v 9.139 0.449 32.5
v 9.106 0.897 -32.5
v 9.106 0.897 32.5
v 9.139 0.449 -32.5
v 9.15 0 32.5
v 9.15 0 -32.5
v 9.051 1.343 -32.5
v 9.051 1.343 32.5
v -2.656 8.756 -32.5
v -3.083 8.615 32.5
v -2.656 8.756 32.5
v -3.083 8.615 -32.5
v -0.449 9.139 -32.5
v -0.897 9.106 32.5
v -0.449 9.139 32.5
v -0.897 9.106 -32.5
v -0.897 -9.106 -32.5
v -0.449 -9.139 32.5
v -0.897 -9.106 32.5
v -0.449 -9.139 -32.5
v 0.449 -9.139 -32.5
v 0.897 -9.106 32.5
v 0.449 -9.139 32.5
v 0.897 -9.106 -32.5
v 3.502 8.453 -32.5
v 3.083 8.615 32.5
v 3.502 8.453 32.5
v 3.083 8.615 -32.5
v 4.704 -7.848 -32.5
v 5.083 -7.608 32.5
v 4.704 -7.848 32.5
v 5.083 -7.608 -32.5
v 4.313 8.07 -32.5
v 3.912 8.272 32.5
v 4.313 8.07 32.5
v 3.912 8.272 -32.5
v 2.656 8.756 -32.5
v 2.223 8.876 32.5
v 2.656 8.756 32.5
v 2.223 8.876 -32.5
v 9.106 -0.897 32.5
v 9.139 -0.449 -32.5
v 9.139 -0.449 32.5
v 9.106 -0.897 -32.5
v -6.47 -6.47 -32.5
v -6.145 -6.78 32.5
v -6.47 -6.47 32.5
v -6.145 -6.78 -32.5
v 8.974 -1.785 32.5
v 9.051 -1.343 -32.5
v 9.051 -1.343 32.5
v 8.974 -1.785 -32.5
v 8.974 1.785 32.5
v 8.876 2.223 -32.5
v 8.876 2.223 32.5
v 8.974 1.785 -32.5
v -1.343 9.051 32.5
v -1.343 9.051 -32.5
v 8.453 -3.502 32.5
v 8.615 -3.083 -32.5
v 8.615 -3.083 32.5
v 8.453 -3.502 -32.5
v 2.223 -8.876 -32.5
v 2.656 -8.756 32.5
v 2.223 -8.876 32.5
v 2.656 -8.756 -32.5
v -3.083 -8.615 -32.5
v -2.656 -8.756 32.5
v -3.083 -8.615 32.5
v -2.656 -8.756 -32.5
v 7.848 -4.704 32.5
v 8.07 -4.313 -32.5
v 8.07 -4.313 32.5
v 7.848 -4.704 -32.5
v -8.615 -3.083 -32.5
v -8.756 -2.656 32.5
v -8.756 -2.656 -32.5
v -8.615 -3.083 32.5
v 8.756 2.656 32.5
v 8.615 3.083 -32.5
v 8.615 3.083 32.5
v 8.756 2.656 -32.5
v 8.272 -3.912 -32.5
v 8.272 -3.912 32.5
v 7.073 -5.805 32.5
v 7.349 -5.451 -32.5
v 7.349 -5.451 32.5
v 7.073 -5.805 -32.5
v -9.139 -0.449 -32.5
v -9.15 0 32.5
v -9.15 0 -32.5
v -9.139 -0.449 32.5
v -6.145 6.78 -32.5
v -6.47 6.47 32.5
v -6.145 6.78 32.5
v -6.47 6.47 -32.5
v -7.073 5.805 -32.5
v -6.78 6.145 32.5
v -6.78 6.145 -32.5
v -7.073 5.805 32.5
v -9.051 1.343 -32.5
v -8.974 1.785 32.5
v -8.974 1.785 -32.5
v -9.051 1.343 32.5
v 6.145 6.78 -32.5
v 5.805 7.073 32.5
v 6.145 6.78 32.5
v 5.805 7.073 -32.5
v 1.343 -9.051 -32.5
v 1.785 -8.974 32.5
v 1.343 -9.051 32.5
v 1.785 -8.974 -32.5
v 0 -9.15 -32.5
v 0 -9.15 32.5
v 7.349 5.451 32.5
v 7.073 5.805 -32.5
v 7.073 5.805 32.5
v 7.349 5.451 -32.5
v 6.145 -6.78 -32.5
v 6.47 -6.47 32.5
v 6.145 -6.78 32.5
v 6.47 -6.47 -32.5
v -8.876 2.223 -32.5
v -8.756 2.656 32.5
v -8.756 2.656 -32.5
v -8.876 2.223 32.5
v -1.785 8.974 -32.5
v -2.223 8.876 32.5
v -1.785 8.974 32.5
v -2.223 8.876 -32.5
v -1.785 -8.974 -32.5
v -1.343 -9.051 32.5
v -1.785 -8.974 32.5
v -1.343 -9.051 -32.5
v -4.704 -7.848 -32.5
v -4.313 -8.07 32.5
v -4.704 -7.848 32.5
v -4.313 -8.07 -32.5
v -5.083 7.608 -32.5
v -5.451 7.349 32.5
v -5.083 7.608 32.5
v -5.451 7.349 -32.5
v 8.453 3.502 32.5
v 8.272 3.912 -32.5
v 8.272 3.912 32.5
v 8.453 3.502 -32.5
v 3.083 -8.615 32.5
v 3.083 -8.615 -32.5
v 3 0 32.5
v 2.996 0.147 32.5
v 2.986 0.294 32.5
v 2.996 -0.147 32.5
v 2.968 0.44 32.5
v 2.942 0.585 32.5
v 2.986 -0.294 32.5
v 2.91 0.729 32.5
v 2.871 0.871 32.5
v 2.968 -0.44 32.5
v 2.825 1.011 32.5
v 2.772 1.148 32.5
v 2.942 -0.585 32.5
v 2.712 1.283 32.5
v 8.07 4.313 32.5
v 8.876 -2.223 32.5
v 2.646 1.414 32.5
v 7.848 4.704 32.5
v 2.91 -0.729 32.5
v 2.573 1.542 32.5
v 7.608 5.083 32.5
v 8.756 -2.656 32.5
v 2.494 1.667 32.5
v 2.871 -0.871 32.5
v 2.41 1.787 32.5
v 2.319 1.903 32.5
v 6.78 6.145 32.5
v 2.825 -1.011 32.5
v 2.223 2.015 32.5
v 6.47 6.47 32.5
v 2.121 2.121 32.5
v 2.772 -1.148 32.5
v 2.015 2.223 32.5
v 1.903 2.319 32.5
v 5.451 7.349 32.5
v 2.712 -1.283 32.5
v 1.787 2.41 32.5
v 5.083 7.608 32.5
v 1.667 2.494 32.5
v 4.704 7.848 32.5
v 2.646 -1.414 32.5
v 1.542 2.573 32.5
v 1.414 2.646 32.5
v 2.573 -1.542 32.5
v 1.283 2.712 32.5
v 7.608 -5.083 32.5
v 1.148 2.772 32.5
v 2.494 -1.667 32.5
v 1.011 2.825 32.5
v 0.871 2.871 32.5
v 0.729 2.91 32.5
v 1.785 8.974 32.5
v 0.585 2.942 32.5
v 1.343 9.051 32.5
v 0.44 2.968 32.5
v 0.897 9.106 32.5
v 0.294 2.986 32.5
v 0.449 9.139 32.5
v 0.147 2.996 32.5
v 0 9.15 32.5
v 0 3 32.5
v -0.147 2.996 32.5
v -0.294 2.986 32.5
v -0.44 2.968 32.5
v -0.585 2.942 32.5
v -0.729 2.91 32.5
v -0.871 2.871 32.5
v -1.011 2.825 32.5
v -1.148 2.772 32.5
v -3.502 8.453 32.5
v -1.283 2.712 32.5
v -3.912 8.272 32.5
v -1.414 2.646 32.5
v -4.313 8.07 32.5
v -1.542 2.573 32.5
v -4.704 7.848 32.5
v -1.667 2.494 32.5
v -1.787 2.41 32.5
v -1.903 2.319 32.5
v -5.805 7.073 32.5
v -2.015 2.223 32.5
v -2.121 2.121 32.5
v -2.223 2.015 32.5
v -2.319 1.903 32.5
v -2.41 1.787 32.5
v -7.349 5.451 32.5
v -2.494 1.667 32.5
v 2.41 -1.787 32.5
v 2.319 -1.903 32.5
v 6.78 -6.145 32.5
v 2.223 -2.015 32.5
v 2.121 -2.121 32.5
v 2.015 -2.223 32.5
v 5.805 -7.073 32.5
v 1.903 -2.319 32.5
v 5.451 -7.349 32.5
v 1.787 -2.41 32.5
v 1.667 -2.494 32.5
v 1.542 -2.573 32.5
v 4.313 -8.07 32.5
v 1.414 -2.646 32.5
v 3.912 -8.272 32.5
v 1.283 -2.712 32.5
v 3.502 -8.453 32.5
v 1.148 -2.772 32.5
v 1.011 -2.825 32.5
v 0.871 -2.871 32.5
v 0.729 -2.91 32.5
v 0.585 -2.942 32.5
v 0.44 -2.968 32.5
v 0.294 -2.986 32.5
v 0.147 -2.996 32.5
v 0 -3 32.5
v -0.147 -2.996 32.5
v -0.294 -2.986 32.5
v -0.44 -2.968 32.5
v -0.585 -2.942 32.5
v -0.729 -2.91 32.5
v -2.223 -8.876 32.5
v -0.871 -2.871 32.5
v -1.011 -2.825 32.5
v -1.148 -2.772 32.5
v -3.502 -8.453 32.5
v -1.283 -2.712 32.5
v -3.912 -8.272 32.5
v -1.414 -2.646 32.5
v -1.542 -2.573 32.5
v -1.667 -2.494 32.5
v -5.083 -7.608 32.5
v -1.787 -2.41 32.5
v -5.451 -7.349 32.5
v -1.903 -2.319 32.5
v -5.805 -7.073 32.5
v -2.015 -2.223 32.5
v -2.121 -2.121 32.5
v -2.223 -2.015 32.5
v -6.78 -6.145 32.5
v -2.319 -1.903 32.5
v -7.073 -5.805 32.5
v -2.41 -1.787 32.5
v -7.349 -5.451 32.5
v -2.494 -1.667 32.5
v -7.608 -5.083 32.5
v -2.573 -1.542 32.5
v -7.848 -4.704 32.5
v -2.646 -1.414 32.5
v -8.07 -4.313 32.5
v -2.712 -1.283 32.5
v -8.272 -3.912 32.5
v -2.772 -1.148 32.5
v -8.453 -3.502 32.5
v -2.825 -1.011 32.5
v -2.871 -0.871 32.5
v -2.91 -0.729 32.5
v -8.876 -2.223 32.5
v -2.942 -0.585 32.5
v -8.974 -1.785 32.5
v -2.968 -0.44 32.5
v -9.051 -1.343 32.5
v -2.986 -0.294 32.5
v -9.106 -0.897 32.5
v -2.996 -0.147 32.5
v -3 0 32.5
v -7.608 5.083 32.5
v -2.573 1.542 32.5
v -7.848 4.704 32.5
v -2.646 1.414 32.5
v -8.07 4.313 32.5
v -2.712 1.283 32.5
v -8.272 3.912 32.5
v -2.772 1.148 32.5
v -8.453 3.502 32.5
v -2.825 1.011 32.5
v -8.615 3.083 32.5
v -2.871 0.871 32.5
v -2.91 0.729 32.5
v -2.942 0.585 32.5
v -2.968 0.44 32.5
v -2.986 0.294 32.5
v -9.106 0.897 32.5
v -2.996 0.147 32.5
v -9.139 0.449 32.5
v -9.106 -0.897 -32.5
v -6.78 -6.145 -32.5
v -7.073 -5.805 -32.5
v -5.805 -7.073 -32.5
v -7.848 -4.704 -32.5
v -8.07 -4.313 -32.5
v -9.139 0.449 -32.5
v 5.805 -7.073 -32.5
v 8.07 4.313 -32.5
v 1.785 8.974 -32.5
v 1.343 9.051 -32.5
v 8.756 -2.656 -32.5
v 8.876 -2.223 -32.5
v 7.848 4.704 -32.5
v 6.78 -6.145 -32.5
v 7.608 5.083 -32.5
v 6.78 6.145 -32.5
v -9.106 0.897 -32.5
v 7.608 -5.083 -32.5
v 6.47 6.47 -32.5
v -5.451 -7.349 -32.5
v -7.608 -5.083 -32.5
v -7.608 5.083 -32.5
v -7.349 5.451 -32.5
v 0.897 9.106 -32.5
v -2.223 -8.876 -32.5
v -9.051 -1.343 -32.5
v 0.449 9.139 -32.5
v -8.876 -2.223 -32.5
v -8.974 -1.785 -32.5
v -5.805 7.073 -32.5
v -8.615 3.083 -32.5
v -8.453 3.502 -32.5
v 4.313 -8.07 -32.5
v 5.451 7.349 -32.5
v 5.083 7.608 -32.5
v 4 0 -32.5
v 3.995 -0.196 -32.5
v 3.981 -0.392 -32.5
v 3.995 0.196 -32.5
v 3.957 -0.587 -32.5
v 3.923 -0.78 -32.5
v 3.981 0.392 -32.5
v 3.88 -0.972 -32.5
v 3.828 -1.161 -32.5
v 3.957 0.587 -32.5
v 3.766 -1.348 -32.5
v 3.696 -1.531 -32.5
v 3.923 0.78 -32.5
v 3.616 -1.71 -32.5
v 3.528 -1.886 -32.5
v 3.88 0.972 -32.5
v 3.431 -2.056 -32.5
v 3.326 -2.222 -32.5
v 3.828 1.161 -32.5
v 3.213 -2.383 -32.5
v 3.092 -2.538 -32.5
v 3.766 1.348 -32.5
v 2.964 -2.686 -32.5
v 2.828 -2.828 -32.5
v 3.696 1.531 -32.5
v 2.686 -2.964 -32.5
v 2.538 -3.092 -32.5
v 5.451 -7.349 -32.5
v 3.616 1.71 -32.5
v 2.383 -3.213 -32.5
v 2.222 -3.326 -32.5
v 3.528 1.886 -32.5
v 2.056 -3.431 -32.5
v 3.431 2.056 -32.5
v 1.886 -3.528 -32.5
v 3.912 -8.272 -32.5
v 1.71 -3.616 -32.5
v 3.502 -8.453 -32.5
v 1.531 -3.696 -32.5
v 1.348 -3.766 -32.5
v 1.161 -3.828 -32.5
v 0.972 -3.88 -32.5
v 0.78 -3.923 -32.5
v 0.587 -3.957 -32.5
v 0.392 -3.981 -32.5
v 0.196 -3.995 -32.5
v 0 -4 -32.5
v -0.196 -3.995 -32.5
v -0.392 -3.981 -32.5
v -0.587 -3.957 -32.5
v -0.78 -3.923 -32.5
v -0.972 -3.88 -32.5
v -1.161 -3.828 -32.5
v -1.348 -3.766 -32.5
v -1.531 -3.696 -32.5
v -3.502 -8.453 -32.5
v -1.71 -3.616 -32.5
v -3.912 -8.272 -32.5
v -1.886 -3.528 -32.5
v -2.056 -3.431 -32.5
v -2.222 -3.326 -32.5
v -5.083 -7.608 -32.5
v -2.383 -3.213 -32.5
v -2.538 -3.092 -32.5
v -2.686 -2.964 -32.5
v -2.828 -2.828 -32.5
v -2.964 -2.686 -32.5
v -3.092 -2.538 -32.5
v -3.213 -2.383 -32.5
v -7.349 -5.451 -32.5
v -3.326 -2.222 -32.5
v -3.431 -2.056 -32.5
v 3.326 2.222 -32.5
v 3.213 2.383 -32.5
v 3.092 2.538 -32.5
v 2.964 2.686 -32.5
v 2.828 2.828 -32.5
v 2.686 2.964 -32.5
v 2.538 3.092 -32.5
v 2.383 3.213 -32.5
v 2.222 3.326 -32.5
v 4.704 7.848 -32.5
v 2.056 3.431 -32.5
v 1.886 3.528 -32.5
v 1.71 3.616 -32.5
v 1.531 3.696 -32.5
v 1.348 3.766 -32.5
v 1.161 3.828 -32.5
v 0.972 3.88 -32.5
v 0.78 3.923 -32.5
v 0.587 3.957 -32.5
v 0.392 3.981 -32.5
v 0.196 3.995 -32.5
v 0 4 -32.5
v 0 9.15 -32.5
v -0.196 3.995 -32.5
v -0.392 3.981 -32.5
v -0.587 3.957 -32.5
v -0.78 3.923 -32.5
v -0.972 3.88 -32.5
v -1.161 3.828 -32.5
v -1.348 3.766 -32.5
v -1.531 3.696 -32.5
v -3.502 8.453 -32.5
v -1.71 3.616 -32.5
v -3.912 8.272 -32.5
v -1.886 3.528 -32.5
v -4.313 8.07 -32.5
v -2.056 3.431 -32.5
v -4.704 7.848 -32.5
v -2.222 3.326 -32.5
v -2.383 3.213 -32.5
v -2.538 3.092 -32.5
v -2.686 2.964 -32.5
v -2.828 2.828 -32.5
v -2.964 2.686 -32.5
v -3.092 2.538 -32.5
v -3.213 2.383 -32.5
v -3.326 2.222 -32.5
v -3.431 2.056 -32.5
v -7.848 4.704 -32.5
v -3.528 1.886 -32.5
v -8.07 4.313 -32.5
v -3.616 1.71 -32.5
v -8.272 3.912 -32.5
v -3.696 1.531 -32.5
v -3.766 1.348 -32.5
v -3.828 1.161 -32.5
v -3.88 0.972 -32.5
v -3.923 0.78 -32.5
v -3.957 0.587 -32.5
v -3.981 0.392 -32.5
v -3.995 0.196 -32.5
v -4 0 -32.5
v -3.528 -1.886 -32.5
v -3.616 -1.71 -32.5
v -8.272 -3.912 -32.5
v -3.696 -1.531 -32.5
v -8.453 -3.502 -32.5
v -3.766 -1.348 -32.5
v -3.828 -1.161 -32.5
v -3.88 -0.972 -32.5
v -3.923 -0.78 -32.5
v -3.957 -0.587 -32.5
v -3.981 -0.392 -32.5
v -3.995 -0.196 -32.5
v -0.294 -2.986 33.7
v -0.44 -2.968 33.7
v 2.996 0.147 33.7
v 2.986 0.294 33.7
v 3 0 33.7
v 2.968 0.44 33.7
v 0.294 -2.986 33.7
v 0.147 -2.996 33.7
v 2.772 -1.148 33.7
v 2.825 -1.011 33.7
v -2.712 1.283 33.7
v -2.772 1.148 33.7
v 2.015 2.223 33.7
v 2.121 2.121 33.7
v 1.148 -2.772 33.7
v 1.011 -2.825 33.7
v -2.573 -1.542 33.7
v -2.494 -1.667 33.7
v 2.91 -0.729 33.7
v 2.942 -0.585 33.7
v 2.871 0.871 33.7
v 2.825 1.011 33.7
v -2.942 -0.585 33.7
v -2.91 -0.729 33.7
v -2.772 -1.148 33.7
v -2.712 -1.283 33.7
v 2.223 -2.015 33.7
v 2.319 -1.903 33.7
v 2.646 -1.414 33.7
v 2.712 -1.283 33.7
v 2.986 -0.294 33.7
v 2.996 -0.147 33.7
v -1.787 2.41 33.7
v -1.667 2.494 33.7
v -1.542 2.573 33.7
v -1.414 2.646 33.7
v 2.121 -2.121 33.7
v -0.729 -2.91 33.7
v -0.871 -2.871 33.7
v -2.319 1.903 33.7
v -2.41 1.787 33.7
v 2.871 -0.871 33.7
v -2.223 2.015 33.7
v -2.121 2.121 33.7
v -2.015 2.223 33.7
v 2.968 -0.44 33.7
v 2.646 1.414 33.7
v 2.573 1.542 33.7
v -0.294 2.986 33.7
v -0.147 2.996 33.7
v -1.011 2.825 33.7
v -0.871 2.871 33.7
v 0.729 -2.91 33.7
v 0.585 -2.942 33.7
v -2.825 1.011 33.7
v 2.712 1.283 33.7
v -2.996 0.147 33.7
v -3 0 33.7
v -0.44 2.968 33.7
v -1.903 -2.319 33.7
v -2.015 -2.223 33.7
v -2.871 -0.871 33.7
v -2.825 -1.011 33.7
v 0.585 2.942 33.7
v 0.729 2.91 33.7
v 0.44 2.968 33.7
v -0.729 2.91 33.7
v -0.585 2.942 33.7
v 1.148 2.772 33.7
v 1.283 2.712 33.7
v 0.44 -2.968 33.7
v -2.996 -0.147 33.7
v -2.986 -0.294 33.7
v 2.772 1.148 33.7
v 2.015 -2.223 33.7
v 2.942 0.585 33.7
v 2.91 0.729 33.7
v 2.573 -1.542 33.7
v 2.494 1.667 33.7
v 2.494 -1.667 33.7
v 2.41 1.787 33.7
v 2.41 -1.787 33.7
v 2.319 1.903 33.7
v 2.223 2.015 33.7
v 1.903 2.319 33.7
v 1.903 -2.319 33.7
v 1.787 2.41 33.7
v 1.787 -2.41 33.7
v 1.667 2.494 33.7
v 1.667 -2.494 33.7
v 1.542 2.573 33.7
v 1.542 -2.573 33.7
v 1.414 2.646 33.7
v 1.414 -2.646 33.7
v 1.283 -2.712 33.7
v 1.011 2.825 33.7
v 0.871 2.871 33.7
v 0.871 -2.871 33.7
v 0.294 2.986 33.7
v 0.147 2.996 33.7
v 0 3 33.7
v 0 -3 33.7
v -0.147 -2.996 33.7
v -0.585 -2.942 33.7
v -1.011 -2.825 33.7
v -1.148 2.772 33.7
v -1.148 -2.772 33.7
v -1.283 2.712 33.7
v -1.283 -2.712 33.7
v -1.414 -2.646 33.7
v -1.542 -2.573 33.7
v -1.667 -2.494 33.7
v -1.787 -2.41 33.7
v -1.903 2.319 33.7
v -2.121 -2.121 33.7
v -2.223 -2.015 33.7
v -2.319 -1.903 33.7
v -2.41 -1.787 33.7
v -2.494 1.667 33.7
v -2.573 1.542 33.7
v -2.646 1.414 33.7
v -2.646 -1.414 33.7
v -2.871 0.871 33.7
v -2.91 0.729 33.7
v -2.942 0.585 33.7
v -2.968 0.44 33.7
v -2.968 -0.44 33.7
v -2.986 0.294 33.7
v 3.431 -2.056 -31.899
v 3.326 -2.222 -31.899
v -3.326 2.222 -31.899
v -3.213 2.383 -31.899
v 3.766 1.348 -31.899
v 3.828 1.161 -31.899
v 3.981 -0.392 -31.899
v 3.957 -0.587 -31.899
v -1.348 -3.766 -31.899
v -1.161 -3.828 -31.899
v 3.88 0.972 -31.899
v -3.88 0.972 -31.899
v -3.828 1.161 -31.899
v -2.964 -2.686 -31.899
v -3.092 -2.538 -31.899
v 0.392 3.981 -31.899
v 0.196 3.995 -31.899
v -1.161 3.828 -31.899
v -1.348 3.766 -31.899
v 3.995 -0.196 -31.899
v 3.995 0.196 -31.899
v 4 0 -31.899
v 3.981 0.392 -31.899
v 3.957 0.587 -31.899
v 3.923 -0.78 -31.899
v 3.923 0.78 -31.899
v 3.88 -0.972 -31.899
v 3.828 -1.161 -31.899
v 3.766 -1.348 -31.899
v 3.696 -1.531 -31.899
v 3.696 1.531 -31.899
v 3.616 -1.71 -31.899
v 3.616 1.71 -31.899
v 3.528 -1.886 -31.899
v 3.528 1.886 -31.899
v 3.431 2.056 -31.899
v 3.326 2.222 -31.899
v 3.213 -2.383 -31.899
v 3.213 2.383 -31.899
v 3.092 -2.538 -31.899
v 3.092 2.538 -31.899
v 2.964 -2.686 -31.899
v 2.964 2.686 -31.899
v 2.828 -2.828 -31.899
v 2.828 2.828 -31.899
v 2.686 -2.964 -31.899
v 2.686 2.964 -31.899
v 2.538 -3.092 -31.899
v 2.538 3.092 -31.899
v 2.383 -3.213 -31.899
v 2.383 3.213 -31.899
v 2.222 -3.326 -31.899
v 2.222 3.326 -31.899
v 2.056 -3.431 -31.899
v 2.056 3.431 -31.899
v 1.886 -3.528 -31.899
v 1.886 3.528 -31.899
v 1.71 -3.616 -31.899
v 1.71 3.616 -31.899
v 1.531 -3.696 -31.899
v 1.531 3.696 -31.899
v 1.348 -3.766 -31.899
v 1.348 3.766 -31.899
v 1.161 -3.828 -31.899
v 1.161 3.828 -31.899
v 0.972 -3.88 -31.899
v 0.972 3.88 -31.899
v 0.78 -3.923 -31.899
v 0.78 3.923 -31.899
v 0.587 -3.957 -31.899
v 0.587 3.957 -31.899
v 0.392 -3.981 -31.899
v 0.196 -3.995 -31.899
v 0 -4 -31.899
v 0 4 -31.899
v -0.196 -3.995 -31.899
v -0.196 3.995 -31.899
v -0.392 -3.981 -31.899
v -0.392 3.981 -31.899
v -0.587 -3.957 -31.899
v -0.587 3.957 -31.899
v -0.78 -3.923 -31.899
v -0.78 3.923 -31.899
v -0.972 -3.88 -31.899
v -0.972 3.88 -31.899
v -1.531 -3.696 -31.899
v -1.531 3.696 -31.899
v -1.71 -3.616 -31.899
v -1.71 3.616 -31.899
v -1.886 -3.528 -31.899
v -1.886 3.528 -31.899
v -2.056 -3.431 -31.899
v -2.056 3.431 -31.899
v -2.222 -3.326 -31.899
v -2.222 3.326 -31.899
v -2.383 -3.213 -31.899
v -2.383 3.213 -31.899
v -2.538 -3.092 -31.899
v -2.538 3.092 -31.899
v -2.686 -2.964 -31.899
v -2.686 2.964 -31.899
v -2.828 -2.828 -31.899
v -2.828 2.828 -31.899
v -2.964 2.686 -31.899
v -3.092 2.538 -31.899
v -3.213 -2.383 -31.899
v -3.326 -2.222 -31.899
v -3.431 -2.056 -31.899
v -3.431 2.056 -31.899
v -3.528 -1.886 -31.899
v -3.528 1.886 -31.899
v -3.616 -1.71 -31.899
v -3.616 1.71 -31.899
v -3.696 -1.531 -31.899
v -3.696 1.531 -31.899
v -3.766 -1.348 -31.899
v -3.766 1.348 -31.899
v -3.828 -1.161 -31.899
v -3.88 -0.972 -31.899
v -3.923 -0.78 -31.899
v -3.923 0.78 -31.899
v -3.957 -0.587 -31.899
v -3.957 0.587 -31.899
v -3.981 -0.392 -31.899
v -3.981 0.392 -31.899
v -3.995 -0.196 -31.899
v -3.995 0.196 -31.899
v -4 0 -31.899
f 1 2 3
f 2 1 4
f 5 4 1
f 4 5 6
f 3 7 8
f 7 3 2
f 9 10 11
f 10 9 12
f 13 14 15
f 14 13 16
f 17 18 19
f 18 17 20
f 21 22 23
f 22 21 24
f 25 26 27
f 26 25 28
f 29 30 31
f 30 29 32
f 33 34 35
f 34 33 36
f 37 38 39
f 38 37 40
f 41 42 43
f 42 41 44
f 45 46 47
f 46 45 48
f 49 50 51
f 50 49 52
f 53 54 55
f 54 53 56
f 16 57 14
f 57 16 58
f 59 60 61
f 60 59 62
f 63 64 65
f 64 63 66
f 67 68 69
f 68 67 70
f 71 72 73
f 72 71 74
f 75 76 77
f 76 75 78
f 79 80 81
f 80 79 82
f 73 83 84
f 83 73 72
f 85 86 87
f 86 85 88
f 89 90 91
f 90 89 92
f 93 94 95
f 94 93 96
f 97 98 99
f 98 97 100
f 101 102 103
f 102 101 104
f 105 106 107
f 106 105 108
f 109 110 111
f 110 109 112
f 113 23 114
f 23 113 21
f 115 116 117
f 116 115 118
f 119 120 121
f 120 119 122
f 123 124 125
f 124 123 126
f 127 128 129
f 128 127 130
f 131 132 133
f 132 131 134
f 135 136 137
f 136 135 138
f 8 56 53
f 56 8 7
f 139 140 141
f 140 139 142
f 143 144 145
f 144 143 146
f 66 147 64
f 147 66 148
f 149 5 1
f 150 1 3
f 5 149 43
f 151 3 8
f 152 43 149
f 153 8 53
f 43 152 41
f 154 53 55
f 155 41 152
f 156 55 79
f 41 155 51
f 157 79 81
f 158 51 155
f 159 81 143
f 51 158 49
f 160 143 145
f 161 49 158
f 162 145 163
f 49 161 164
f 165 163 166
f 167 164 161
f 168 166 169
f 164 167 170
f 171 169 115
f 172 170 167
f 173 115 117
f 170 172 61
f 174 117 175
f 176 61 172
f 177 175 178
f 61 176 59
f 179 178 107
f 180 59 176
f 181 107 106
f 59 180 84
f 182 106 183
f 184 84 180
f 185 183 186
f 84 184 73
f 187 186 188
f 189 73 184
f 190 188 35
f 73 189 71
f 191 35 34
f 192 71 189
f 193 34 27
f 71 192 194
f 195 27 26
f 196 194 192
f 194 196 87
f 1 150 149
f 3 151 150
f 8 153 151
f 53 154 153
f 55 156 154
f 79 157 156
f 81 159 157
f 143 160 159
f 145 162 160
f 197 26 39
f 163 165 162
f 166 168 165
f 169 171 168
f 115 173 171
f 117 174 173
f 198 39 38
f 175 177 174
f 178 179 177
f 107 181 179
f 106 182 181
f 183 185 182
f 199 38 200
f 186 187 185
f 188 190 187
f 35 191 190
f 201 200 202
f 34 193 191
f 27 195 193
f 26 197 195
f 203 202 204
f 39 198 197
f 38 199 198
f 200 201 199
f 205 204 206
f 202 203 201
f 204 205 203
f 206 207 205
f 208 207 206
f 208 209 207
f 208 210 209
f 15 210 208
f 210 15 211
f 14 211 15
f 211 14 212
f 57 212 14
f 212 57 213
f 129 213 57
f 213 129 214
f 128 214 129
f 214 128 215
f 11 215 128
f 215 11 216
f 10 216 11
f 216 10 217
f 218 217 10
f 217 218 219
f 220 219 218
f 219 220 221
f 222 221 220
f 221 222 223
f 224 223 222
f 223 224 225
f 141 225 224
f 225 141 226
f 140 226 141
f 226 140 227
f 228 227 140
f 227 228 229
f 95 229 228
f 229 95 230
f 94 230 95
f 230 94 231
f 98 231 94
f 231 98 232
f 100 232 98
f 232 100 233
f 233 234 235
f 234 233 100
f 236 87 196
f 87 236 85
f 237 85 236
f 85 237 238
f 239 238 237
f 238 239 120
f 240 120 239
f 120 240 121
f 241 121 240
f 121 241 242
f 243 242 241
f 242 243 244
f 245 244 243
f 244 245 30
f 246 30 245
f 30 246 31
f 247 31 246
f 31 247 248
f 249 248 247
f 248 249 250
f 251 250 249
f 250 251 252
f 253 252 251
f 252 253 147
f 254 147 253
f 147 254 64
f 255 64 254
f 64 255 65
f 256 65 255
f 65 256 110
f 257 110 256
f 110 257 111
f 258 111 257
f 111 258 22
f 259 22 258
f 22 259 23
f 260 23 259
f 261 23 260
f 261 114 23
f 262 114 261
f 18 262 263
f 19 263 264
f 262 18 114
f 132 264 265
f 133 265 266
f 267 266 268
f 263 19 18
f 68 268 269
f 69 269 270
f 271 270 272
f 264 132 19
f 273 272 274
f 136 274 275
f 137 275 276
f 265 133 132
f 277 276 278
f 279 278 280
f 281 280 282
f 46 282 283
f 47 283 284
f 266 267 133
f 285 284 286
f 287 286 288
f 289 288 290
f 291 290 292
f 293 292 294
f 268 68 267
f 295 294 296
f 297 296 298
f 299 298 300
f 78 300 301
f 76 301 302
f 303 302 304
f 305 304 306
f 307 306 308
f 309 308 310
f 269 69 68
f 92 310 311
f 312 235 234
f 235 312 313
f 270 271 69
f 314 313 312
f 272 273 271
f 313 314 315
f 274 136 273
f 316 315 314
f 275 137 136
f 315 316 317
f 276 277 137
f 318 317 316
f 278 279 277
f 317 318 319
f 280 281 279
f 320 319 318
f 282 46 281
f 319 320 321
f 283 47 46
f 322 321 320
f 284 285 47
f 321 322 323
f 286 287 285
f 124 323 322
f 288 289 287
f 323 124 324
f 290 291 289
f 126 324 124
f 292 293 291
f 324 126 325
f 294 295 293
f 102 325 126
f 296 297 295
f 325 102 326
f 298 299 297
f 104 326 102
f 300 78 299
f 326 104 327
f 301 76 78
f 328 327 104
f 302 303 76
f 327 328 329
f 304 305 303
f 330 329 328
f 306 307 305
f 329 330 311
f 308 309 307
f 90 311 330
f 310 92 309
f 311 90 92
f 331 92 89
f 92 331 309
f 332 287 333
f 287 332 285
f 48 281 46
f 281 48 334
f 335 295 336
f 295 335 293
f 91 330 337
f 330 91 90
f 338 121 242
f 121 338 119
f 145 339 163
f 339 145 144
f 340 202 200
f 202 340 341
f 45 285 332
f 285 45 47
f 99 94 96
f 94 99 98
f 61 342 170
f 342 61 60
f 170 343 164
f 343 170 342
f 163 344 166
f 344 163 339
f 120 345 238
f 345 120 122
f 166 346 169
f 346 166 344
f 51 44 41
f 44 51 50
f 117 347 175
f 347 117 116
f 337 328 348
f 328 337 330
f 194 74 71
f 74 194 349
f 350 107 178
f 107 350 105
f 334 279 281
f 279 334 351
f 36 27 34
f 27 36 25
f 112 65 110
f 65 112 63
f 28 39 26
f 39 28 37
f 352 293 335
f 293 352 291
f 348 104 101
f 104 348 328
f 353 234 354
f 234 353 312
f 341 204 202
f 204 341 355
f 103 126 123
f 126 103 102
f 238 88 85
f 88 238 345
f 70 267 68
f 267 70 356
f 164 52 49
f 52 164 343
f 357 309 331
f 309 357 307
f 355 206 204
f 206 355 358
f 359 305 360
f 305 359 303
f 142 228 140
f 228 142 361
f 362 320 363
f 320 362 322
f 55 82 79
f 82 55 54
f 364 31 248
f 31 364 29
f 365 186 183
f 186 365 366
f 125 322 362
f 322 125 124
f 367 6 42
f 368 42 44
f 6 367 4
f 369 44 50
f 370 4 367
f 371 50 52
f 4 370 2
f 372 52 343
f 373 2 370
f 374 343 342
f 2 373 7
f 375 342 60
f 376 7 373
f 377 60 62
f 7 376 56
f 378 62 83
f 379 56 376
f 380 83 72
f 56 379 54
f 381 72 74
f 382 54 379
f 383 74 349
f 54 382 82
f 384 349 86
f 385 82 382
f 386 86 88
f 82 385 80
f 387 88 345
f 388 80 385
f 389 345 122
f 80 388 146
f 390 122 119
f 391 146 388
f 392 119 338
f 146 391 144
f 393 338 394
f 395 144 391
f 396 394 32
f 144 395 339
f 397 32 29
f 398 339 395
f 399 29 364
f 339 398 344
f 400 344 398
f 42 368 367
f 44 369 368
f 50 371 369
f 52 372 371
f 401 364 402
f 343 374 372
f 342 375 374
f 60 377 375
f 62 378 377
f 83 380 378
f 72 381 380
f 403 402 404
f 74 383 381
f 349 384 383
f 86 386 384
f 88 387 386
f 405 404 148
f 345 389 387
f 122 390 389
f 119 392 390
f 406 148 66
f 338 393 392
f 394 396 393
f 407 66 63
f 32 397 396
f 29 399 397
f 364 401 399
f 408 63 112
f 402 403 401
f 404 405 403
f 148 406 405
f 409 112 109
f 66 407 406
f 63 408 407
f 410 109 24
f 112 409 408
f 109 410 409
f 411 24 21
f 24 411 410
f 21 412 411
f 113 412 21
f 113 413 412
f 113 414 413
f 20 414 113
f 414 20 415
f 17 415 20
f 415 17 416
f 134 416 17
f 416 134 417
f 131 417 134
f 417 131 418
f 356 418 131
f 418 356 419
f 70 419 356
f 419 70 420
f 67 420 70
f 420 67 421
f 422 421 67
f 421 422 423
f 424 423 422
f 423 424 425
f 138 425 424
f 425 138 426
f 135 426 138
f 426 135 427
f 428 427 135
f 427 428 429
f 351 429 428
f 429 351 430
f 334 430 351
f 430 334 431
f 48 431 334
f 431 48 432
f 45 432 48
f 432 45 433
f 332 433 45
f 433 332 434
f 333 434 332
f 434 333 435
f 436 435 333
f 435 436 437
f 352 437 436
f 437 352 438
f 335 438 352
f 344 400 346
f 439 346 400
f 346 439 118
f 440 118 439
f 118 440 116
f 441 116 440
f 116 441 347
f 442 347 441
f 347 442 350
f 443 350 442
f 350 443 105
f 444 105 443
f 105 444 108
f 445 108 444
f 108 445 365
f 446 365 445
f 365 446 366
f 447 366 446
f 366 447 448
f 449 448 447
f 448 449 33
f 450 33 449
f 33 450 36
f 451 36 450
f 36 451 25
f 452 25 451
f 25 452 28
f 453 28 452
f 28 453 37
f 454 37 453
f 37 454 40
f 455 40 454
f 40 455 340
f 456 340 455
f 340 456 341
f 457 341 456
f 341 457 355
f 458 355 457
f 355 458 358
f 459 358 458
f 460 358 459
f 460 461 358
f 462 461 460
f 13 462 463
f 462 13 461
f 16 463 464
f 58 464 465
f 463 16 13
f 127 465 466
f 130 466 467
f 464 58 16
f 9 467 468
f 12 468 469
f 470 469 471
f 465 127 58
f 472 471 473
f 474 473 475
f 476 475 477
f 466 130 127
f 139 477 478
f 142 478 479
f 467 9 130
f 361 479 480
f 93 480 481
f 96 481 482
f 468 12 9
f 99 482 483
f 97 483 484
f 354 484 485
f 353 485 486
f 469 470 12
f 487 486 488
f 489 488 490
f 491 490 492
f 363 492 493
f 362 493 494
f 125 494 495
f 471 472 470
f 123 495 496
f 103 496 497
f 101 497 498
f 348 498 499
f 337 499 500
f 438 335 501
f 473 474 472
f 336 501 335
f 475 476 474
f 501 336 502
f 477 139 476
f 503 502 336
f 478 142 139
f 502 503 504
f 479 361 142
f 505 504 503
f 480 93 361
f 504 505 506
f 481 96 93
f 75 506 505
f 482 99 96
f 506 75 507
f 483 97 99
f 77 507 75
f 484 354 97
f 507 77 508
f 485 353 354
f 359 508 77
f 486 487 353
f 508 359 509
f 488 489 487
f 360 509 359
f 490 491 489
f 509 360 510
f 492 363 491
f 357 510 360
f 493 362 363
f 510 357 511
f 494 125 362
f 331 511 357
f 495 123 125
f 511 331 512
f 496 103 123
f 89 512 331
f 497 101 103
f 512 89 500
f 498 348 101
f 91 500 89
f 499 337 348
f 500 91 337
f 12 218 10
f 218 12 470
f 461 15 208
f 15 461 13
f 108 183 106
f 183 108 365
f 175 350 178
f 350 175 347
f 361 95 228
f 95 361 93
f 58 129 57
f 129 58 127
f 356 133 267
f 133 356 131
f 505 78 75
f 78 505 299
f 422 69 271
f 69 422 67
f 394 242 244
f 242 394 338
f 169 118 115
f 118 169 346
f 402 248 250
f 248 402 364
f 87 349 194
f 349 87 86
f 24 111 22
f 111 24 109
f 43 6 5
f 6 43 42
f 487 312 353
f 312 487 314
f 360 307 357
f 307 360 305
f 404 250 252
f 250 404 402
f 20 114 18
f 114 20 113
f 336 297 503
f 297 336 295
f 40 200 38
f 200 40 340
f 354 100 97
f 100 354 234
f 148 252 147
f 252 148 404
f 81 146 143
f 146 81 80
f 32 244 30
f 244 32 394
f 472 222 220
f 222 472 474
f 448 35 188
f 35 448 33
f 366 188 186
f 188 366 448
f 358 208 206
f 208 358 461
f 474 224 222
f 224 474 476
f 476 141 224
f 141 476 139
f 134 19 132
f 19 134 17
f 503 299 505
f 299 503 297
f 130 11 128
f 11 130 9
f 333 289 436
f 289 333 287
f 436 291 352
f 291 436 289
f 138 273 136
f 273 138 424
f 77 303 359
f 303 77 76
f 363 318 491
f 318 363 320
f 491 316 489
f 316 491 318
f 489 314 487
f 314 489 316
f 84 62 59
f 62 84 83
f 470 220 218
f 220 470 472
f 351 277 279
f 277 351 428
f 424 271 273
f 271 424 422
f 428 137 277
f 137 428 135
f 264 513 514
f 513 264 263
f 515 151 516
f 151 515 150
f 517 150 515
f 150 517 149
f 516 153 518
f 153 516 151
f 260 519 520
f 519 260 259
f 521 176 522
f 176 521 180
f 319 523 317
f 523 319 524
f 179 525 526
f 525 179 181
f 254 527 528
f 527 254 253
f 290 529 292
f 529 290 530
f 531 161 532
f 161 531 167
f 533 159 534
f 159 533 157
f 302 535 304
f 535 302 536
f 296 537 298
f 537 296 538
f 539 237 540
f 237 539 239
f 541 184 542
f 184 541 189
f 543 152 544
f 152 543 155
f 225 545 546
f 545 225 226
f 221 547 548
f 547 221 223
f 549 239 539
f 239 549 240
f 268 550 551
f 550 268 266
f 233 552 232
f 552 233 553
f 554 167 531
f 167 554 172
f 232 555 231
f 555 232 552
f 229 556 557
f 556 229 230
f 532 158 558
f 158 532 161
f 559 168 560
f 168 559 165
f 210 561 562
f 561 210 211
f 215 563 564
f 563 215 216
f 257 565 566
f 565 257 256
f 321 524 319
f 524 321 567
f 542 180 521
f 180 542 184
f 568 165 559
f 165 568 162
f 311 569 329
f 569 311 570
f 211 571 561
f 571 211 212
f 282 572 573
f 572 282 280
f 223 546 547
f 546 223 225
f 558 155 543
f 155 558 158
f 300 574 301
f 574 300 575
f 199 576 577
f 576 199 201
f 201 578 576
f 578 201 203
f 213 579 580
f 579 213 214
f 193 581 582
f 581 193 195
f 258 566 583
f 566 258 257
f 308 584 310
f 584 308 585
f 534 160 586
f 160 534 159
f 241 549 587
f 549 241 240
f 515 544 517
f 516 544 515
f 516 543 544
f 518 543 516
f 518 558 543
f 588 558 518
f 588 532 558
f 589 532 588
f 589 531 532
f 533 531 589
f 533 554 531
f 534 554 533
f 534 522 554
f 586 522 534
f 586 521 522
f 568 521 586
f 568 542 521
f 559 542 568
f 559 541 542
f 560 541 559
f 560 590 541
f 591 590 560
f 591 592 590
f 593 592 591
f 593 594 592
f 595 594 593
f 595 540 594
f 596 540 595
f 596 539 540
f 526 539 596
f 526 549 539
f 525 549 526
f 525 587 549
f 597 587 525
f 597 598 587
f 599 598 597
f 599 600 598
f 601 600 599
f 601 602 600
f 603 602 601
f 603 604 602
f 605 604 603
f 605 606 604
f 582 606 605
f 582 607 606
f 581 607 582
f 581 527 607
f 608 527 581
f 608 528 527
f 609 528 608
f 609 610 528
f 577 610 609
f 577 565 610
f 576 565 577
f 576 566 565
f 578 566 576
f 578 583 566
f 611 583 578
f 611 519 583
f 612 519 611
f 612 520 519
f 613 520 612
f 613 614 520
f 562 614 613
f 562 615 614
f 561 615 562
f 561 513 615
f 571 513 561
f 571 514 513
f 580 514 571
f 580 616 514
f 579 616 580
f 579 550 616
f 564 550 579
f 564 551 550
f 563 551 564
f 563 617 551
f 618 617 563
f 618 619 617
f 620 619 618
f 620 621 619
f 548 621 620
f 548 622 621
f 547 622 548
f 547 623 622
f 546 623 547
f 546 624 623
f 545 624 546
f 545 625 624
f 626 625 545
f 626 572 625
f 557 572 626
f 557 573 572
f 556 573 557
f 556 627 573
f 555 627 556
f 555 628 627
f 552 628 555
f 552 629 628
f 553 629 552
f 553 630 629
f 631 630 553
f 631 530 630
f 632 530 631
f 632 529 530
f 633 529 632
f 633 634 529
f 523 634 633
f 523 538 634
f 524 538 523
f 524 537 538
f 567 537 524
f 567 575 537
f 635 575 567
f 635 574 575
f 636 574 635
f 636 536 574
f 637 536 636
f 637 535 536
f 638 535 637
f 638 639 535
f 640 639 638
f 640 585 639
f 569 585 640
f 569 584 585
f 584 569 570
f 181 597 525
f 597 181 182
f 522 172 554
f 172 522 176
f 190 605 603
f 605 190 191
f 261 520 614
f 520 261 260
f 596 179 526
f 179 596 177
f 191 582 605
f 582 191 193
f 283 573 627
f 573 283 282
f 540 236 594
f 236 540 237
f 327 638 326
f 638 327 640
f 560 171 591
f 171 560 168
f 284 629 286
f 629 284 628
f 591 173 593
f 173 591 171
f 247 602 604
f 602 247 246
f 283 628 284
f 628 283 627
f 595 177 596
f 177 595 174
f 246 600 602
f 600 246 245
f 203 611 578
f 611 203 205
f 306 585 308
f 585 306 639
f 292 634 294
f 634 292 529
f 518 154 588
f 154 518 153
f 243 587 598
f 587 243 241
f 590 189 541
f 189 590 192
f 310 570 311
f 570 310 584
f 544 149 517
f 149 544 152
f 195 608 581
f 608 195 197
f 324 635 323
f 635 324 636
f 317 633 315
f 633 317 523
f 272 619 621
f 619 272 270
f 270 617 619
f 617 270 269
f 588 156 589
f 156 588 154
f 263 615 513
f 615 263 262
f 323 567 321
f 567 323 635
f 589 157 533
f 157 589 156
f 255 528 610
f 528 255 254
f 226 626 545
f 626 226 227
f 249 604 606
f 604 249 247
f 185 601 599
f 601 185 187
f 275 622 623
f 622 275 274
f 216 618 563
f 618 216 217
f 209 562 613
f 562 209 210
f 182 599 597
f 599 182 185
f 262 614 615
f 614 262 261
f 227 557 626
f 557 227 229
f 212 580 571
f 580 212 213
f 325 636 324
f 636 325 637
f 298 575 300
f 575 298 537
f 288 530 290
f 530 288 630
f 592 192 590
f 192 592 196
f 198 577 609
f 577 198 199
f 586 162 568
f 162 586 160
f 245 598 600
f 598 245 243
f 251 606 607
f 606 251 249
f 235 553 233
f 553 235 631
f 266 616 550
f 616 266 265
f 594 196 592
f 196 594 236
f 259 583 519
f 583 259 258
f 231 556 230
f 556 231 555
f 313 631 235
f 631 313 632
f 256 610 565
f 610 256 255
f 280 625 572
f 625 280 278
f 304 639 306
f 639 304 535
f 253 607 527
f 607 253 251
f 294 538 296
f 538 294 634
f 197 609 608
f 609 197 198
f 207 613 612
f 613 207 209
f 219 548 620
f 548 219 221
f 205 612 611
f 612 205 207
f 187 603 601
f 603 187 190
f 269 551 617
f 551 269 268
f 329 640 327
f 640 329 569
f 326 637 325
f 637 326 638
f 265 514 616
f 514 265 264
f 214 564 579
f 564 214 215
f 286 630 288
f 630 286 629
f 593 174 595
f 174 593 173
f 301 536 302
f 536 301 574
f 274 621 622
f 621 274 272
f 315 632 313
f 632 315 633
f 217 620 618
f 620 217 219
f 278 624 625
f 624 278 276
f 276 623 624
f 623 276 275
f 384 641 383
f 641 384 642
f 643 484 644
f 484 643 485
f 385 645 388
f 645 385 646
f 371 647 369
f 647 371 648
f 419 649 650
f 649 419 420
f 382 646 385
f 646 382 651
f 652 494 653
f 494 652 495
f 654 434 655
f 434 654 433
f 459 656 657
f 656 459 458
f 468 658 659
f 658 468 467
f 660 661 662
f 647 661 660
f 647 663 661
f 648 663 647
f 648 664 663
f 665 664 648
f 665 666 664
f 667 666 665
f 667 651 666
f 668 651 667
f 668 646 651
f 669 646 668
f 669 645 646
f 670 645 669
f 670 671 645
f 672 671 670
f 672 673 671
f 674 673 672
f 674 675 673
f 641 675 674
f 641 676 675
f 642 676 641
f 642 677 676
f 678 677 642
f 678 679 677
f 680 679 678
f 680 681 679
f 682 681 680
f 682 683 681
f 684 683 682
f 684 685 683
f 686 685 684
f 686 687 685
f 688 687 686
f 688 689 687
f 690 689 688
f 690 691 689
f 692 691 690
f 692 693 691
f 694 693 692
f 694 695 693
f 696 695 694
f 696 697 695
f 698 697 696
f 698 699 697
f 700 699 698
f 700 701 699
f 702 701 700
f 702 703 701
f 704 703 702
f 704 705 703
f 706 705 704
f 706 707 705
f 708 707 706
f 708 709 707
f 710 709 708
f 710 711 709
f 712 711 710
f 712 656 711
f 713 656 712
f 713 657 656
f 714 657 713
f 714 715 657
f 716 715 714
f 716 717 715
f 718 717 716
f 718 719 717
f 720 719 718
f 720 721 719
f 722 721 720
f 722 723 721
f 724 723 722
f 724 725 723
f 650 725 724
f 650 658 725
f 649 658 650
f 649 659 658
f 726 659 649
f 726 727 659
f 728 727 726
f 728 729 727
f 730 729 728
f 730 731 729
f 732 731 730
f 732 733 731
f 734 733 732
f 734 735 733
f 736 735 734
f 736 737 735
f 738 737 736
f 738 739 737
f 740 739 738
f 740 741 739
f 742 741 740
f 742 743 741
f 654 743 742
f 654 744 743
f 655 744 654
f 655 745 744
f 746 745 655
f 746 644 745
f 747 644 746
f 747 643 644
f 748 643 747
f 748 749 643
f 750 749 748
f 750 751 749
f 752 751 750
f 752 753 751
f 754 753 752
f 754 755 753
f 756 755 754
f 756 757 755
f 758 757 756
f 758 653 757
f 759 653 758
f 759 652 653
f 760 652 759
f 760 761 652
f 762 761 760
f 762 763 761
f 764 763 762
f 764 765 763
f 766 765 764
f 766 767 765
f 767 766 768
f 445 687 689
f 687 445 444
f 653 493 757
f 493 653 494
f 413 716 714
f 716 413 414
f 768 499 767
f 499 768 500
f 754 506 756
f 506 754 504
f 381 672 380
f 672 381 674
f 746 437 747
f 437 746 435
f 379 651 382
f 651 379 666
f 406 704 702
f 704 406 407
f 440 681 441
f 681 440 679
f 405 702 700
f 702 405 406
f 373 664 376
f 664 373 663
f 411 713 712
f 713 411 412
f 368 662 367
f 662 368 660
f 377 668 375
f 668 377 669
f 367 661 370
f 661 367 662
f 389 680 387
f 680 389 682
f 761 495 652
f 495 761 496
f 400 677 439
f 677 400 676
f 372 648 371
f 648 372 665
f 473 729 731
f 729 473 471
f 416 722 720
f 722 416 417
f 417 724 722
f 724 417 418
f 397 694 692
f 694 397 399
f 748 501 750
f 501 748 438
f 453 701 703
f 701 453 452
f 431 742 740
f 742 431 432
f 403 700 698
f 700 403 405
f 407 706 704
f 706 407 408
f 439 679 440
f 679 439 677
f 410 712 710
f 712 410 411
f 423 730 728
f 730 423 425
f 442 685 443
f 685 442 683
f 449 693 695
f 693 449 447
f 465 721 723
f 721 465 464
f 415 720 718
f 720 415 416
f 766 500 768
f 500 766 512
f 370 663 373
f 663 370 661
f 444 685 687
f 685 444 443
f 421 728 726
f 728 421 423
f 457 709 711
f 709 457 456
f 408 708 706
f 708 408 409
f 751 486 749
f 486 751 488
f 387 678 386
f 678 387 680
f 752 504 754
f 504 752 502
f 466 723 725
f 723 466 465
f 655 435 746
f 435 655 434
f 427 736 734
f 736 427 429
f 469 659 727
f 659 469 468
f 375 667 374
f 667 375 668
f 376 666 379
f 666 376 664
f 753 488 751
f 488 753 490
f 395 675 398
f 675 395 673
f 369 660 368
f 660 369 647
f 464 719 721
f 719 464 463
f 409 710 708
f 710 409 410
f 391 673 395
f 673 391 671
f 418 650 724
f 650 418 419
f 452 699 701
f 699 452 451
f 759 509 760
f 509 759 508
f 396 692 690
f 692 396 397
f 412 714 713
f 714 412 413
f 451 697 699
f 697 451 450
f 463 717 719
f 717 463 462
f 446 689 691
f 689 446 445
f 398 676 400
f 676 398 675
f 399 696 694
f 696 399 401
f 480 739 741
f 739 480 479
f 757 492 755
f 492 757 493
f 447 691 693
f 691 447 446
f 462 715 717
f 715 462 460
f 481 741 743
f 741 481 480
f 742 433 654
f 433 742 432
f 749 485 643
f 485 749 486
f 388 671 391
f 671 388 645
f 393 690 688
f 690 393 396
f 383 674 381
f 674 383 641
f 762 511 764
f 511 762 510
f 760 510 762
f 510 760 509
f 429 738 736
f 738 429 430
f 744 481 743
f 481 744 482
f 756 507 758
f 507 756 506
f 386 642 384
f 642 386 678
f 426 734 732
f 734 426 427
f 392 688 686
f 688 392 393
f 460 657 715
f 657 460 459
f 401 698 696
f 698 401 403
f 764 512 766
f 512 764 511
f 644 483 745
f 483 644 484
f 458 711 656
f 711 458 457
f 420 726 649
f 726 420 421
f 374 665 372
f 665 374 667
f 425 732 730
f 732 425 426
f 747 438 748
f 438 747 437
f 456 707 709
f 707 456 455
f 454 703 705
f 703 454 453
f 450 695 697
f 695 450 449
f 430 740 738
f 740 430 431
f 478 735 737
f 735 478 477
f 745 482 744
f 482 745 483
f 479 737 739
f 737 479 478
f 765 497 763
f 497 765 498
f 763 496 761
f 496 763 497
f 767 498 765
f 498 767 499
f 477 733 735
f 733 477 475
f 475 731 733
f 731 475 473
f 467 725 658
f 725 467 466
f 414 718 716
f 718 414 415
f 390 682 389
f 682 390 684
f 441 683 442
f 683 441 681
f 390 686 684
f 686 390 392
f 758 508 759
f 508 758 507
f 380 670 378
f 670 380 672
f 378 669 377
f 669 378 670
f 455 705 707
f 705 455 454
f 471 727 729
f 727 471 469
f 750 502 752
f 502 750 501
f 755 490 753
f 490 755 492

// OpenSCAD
$fn=128;

module battery_cell(height=65.0, diameter=18.3, button_h=1.2, button_d=6.0, neg_recess_h=0.6, neg_recess_d=8.0) {
    r = diameter/2;

    difference() {
        union() {
            cylinder(h=height, r=r, center=true);
            translate([0,0,height/2]) cylinder(h=button_h, r=button_d/2, center=false);
        }
        translate([0,0,-height/2 - 0.001]) cylinder(h=neg_recess_h + 0.002, r=neg_recess_d/2, center=false);
    }
}

battery_cell();
